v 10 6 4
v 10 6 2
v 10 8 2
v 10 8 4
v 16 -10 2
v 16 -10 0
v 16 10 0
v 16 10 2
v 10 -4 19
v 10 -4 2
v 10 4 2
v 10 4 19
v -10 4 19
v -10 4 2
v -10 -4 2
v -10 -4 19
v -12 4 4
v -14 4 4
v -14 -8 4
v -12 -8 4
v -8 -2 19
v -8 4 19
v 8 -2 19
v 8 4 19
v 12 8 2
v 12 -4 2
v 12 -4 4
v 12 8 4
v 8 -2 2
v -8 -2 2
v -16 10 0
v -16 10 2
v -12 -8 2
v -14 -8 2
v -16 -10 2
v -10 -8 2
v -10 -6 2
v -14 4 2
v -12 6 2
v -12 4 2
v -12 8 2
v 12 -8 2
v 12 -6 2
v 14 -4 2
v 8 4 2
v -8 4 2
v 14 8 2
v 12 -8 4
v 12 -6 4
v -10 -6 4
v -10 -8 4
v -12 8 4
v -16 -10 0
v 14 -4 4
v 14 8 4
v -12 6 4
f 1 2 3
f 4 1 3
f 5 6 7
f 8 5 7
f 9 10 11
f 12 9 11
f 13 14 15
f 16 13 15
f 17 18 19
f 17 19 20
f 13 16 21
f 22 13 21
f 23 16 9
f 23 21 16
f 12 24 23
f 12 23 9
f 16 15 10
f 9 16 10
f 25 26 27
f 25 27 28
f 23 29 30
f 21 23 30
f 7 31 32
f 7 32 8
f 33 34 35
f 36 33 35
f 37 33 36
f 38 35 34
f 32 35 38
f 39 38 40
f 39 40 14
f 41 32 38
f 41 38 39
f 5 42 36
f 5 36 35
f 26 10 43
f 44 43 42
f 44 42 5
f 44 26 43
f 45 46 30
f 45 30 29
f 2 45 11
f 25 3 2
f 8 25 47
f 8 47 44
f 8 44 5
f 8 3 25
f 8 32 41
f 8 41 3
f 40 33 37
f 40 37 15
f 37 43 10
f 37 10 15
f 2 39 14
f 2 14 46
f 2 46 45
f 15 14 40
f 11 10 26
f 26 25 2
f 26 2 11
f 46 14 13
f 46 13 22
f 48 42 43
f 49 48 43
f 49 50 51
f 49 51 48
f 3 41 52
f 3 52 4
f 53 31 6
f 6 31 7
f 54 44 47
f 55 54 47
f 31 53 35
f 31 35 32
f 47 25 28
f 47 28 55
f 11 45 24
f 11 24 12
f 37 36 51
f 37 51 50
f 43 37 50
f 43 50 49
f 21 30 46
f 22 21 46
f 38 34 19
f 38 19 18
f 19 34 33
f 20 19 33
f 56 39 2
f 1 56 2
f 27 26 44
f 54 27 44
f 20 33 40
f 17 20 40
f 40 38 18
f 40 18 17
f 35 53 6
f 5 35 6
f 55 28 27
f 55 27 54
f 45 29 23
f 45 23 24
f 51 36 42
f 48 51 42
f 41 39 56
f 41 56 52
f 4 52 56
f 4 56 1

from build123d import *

# Parameters (mm, degrees)
F1_W     = 32
F1_H     = 20
F2_DEPTH = 2
F3_W     = 22
F3_H     = 2
F3_W_2   = 2
F3_H_2   = 12
F4_DEPTH = 2
F5_W     = 2
F5_H     = 6
F6_DEPTH = 17


with BuildPart() as f2:
    # F1 (on Top) → F2 (new body)
    with BuildSketch(Plane.XY):
        Rectangle(F1_W, F1_H)
    extrude(amount=F2_DEPTH)

    # F3 (on face) → F4 (join)
    with BuildSketch(Plane.XY.offset(2)):
        with Locations((-1, 7)):
            Rectangle(F3_W, F3_H)
        with Locations((13, 2)):
            Rectangle(F3_W_2, F3_H_2)
        with Locations((1, -7)):
            Rectangle(F3_W, F3_H)
        with Locations((-13, -2)):
            Rectangle(F3_W_2, F3_H_2)
    extrude(amount=F4_DEPTH)

    # F5 (on face) → F6 (join)
    with BuildSketch(Plane.XY.offset(2)):
        with Locations((-9, 1)):
            Rectangle(F5_W, F5_H)
        Polygon((-10, -2), (-10, -4), (10, -4), (10, -2), (8, -2), (-8, -2), align=None)
        with Locations((9, 1)):
            Rectangle(F5_W, F5_H)
    extrude(amount=F6_DEPTH)


solid = f2.part
